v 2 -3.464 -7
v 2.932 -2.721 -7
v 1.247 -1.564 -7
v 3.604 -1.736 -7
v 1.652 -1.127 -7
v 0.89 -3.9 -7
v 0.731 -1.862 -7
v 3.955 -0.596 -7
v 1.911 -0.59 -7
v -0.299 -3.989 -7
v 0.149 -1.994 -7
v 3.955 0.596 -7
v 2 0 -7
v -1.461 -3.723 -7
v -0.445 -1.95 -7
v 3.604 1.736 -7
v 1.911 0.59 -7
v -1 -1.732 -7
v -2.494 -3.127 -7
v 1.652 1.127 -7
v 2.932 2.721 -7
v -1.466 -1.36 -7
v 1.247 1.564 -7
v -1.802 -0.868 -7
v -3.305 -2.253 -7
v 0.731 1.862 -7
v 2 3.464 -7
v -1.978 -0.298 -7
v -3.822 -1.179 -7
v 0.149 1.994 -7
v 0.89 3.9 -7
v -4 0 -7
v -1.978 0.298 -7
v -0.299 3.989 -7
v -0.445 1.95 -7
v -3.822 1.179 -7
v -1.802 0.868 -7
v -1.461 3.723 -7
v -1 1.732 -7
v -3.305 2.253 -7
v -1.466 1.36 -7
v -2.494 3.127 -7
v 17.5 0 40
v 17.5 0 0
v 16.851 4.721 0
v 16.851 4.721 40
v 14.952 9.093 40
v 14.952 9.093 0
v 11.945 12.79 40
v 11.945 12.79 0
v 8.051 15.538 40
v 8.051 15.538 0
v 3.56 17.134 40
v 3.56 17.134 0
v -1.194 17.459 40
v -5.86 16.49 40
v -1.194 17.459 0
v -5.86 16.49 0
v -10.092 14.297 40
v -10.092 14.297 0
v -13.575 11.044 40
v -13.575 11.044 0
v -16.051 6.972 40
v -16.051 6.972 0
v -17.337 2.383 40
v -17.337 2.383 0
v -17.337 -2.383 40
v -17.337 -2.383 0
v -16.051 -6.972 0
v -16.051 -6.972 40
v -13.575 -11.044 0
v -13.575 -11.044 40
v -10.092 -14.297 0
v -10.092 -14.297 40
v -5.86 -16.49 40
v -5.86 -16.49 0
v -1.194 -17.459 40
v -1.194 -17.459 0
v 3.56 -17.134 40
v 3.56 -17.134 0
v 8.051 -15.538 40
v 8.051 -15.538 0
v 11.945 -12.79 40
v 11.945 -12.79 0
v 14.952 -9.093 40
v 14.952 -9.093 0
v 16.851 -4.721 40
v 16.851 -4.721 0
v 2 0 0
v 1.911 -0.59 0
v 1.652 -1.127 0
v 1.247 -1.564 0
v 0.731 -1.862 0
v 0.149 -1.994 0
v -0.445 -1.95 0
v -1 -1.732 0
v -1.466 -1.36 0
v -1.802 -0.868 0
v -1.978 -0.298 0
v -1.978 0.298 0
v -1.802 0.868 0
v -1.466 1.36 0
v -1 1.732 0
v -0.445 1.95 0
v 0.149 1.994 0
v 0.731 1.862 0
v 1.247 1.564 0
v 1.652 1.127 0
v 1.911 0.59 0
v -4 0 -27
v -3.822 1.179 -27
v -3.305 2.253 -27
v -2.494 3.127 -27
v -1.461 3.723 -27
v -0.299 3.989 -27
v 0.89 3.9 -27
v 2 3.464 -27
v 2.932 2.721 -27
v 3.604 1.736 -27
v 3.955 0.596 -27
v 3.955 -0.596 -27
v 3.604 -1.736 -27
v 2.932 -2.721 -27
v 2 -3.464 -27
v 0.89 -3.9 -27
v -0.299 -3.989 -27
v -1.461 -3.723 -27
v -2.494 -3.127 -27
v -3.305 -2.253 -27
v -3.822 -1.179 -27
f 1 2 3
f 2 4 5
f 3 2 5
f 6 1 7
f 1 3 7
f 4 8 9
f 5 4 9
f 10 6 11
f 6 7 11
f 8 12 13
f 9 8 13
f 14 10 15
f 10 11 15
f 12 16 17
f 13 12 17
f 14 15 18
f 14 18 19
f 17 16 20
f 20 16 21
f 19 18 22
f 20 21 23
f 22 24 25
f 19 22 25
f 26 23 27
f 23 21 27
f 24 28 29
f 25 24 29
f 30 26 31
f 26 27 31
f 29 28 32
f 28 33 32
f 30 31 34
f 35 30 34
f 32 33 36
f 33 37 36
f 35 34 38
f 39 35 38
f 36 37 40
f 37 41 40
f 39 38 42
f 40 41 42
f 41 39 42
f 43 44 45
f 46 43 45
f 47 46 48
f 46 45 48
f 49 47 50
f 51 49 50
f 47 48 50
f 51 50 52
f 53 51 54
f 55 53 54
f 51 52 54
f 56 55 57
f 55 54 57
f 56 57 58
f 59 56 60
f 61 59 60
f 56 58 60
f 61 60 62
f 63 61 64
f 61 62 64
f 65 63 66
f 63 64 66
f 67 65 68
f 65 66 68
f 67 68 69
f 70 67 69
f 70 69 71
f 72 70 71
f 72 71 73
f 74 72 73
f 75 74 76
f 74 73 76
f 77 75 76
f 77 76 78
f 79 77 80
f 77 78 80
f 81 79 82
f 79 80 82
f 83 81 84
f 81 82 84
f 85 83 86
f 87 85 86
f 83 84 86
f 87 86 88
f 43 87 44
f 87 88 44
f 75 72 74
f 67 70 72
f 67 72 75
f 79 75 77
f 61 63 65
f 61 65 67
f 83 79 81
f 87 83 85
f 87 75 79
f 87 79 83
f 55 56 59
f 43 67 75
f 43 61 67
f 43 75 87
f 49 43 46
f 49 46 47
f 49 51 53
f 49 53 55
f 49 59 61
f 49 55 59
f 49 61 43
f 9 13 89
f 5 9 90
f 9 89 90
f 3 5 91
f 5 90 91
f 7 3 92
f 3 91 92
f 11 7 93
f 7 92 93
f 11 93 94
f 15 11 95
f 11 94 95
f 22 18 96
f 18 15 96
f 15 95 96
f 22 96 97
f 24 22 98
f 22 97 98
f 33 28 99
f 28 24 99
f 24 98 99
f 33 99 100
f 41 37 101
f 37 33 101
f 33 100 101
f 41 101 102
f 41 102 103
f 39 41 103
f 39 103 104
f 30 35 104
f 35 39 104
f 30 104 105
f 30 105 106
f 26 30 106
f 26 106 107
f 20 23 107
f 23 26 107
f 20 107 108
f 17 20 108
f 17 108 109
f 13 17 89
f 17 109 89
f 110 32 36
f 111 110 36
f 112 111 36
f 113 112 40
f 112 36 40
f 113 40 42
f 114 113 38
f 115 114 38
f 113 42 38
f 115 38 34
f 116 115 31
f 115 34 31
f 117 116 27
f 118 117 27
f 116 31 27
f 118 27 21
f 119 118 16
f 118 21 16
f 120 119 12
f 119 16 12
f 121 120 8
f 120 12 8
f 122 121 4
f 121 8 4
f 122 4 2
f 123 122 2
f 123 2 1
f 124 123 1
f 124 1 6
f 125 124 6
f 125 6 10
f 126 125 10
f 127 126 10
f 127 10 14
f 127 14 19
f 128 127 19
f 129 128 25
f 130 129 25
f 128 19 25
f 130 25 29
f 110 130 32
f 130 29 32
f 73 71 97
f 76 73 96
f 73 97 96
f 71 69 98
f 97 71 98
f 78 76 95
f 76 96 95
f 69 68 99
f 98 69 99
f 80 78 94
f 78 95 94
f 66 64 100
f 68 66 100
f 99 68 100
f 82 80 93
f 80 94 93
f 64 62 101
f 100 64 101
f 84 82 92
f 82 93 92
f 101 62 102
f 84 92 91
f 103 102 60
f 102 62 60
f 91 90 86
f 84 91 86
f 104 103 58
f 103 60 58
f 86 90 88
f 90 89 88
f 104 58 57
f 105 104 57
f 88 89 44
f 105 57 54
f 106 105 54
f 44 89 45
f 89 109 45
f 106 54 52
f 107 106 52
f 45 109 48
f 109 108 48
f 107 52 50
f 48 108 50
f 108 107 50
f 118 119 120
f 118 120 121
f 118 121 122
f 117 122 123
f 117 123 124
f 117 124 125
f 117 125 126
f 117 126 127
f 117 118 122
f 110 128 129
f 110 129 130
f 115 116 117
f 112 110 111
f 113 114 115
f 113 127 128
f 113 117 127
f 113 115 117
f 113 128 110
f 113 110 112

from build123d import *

# Parameters (mm, degrees)
SKETCH1_R                = 17.5
BOSS_EXTRUDE1_DEPTH      = 40
SKETCH2_R                = 2
BOSS_EXTRUDE2_DEPTH      = 17
BOSS_EXTRUDE3_DEPTH      = 10
BOSS_EXTRUDE3_DEPTH_BACK = 10
SKETCH3_R                = 4


with BuildPart() as part:
    # Sketch1 → Boss-Extrude1 (new body)
    with BuildSketch(Plane.XY):
        Circle(SKETCH1_R)
    extrude(amount=BOSS_EXTRUDE1_DEPTH)

    # Sketch2 → Boss-Extrude2 (add)
    with BuildSketch(Plane(origin=(0, 0, 0), x_dir=(-1, 0, 0), z_dir=(0, 0, -1))):
        with Locations(Location((0, 0, 0), (0, 0, 180))):
            Circle(SKETCH2_R)
    extrude(amount=BOSS_EXTRUDE2_DEPTH)

    # Sketch3 → Boss-Extrude3 (add, two sides: drawn at the far end of the back side and taken through both)
    with BuildSketch(Plane(origin=(0, 0, -17), x_dir=(-1, 0, 0), z_dir=(0, 0, -1)).offset(-BOSS_EXTRUDE3_DEPTH_BACK)):
        Circle(SKETCH3_R)
    extrude(amount=BOSS_EXTRUDE3_DEPTH + BOSS_EXTRUDE3_DEPTH_BACK)


solid = part.part
